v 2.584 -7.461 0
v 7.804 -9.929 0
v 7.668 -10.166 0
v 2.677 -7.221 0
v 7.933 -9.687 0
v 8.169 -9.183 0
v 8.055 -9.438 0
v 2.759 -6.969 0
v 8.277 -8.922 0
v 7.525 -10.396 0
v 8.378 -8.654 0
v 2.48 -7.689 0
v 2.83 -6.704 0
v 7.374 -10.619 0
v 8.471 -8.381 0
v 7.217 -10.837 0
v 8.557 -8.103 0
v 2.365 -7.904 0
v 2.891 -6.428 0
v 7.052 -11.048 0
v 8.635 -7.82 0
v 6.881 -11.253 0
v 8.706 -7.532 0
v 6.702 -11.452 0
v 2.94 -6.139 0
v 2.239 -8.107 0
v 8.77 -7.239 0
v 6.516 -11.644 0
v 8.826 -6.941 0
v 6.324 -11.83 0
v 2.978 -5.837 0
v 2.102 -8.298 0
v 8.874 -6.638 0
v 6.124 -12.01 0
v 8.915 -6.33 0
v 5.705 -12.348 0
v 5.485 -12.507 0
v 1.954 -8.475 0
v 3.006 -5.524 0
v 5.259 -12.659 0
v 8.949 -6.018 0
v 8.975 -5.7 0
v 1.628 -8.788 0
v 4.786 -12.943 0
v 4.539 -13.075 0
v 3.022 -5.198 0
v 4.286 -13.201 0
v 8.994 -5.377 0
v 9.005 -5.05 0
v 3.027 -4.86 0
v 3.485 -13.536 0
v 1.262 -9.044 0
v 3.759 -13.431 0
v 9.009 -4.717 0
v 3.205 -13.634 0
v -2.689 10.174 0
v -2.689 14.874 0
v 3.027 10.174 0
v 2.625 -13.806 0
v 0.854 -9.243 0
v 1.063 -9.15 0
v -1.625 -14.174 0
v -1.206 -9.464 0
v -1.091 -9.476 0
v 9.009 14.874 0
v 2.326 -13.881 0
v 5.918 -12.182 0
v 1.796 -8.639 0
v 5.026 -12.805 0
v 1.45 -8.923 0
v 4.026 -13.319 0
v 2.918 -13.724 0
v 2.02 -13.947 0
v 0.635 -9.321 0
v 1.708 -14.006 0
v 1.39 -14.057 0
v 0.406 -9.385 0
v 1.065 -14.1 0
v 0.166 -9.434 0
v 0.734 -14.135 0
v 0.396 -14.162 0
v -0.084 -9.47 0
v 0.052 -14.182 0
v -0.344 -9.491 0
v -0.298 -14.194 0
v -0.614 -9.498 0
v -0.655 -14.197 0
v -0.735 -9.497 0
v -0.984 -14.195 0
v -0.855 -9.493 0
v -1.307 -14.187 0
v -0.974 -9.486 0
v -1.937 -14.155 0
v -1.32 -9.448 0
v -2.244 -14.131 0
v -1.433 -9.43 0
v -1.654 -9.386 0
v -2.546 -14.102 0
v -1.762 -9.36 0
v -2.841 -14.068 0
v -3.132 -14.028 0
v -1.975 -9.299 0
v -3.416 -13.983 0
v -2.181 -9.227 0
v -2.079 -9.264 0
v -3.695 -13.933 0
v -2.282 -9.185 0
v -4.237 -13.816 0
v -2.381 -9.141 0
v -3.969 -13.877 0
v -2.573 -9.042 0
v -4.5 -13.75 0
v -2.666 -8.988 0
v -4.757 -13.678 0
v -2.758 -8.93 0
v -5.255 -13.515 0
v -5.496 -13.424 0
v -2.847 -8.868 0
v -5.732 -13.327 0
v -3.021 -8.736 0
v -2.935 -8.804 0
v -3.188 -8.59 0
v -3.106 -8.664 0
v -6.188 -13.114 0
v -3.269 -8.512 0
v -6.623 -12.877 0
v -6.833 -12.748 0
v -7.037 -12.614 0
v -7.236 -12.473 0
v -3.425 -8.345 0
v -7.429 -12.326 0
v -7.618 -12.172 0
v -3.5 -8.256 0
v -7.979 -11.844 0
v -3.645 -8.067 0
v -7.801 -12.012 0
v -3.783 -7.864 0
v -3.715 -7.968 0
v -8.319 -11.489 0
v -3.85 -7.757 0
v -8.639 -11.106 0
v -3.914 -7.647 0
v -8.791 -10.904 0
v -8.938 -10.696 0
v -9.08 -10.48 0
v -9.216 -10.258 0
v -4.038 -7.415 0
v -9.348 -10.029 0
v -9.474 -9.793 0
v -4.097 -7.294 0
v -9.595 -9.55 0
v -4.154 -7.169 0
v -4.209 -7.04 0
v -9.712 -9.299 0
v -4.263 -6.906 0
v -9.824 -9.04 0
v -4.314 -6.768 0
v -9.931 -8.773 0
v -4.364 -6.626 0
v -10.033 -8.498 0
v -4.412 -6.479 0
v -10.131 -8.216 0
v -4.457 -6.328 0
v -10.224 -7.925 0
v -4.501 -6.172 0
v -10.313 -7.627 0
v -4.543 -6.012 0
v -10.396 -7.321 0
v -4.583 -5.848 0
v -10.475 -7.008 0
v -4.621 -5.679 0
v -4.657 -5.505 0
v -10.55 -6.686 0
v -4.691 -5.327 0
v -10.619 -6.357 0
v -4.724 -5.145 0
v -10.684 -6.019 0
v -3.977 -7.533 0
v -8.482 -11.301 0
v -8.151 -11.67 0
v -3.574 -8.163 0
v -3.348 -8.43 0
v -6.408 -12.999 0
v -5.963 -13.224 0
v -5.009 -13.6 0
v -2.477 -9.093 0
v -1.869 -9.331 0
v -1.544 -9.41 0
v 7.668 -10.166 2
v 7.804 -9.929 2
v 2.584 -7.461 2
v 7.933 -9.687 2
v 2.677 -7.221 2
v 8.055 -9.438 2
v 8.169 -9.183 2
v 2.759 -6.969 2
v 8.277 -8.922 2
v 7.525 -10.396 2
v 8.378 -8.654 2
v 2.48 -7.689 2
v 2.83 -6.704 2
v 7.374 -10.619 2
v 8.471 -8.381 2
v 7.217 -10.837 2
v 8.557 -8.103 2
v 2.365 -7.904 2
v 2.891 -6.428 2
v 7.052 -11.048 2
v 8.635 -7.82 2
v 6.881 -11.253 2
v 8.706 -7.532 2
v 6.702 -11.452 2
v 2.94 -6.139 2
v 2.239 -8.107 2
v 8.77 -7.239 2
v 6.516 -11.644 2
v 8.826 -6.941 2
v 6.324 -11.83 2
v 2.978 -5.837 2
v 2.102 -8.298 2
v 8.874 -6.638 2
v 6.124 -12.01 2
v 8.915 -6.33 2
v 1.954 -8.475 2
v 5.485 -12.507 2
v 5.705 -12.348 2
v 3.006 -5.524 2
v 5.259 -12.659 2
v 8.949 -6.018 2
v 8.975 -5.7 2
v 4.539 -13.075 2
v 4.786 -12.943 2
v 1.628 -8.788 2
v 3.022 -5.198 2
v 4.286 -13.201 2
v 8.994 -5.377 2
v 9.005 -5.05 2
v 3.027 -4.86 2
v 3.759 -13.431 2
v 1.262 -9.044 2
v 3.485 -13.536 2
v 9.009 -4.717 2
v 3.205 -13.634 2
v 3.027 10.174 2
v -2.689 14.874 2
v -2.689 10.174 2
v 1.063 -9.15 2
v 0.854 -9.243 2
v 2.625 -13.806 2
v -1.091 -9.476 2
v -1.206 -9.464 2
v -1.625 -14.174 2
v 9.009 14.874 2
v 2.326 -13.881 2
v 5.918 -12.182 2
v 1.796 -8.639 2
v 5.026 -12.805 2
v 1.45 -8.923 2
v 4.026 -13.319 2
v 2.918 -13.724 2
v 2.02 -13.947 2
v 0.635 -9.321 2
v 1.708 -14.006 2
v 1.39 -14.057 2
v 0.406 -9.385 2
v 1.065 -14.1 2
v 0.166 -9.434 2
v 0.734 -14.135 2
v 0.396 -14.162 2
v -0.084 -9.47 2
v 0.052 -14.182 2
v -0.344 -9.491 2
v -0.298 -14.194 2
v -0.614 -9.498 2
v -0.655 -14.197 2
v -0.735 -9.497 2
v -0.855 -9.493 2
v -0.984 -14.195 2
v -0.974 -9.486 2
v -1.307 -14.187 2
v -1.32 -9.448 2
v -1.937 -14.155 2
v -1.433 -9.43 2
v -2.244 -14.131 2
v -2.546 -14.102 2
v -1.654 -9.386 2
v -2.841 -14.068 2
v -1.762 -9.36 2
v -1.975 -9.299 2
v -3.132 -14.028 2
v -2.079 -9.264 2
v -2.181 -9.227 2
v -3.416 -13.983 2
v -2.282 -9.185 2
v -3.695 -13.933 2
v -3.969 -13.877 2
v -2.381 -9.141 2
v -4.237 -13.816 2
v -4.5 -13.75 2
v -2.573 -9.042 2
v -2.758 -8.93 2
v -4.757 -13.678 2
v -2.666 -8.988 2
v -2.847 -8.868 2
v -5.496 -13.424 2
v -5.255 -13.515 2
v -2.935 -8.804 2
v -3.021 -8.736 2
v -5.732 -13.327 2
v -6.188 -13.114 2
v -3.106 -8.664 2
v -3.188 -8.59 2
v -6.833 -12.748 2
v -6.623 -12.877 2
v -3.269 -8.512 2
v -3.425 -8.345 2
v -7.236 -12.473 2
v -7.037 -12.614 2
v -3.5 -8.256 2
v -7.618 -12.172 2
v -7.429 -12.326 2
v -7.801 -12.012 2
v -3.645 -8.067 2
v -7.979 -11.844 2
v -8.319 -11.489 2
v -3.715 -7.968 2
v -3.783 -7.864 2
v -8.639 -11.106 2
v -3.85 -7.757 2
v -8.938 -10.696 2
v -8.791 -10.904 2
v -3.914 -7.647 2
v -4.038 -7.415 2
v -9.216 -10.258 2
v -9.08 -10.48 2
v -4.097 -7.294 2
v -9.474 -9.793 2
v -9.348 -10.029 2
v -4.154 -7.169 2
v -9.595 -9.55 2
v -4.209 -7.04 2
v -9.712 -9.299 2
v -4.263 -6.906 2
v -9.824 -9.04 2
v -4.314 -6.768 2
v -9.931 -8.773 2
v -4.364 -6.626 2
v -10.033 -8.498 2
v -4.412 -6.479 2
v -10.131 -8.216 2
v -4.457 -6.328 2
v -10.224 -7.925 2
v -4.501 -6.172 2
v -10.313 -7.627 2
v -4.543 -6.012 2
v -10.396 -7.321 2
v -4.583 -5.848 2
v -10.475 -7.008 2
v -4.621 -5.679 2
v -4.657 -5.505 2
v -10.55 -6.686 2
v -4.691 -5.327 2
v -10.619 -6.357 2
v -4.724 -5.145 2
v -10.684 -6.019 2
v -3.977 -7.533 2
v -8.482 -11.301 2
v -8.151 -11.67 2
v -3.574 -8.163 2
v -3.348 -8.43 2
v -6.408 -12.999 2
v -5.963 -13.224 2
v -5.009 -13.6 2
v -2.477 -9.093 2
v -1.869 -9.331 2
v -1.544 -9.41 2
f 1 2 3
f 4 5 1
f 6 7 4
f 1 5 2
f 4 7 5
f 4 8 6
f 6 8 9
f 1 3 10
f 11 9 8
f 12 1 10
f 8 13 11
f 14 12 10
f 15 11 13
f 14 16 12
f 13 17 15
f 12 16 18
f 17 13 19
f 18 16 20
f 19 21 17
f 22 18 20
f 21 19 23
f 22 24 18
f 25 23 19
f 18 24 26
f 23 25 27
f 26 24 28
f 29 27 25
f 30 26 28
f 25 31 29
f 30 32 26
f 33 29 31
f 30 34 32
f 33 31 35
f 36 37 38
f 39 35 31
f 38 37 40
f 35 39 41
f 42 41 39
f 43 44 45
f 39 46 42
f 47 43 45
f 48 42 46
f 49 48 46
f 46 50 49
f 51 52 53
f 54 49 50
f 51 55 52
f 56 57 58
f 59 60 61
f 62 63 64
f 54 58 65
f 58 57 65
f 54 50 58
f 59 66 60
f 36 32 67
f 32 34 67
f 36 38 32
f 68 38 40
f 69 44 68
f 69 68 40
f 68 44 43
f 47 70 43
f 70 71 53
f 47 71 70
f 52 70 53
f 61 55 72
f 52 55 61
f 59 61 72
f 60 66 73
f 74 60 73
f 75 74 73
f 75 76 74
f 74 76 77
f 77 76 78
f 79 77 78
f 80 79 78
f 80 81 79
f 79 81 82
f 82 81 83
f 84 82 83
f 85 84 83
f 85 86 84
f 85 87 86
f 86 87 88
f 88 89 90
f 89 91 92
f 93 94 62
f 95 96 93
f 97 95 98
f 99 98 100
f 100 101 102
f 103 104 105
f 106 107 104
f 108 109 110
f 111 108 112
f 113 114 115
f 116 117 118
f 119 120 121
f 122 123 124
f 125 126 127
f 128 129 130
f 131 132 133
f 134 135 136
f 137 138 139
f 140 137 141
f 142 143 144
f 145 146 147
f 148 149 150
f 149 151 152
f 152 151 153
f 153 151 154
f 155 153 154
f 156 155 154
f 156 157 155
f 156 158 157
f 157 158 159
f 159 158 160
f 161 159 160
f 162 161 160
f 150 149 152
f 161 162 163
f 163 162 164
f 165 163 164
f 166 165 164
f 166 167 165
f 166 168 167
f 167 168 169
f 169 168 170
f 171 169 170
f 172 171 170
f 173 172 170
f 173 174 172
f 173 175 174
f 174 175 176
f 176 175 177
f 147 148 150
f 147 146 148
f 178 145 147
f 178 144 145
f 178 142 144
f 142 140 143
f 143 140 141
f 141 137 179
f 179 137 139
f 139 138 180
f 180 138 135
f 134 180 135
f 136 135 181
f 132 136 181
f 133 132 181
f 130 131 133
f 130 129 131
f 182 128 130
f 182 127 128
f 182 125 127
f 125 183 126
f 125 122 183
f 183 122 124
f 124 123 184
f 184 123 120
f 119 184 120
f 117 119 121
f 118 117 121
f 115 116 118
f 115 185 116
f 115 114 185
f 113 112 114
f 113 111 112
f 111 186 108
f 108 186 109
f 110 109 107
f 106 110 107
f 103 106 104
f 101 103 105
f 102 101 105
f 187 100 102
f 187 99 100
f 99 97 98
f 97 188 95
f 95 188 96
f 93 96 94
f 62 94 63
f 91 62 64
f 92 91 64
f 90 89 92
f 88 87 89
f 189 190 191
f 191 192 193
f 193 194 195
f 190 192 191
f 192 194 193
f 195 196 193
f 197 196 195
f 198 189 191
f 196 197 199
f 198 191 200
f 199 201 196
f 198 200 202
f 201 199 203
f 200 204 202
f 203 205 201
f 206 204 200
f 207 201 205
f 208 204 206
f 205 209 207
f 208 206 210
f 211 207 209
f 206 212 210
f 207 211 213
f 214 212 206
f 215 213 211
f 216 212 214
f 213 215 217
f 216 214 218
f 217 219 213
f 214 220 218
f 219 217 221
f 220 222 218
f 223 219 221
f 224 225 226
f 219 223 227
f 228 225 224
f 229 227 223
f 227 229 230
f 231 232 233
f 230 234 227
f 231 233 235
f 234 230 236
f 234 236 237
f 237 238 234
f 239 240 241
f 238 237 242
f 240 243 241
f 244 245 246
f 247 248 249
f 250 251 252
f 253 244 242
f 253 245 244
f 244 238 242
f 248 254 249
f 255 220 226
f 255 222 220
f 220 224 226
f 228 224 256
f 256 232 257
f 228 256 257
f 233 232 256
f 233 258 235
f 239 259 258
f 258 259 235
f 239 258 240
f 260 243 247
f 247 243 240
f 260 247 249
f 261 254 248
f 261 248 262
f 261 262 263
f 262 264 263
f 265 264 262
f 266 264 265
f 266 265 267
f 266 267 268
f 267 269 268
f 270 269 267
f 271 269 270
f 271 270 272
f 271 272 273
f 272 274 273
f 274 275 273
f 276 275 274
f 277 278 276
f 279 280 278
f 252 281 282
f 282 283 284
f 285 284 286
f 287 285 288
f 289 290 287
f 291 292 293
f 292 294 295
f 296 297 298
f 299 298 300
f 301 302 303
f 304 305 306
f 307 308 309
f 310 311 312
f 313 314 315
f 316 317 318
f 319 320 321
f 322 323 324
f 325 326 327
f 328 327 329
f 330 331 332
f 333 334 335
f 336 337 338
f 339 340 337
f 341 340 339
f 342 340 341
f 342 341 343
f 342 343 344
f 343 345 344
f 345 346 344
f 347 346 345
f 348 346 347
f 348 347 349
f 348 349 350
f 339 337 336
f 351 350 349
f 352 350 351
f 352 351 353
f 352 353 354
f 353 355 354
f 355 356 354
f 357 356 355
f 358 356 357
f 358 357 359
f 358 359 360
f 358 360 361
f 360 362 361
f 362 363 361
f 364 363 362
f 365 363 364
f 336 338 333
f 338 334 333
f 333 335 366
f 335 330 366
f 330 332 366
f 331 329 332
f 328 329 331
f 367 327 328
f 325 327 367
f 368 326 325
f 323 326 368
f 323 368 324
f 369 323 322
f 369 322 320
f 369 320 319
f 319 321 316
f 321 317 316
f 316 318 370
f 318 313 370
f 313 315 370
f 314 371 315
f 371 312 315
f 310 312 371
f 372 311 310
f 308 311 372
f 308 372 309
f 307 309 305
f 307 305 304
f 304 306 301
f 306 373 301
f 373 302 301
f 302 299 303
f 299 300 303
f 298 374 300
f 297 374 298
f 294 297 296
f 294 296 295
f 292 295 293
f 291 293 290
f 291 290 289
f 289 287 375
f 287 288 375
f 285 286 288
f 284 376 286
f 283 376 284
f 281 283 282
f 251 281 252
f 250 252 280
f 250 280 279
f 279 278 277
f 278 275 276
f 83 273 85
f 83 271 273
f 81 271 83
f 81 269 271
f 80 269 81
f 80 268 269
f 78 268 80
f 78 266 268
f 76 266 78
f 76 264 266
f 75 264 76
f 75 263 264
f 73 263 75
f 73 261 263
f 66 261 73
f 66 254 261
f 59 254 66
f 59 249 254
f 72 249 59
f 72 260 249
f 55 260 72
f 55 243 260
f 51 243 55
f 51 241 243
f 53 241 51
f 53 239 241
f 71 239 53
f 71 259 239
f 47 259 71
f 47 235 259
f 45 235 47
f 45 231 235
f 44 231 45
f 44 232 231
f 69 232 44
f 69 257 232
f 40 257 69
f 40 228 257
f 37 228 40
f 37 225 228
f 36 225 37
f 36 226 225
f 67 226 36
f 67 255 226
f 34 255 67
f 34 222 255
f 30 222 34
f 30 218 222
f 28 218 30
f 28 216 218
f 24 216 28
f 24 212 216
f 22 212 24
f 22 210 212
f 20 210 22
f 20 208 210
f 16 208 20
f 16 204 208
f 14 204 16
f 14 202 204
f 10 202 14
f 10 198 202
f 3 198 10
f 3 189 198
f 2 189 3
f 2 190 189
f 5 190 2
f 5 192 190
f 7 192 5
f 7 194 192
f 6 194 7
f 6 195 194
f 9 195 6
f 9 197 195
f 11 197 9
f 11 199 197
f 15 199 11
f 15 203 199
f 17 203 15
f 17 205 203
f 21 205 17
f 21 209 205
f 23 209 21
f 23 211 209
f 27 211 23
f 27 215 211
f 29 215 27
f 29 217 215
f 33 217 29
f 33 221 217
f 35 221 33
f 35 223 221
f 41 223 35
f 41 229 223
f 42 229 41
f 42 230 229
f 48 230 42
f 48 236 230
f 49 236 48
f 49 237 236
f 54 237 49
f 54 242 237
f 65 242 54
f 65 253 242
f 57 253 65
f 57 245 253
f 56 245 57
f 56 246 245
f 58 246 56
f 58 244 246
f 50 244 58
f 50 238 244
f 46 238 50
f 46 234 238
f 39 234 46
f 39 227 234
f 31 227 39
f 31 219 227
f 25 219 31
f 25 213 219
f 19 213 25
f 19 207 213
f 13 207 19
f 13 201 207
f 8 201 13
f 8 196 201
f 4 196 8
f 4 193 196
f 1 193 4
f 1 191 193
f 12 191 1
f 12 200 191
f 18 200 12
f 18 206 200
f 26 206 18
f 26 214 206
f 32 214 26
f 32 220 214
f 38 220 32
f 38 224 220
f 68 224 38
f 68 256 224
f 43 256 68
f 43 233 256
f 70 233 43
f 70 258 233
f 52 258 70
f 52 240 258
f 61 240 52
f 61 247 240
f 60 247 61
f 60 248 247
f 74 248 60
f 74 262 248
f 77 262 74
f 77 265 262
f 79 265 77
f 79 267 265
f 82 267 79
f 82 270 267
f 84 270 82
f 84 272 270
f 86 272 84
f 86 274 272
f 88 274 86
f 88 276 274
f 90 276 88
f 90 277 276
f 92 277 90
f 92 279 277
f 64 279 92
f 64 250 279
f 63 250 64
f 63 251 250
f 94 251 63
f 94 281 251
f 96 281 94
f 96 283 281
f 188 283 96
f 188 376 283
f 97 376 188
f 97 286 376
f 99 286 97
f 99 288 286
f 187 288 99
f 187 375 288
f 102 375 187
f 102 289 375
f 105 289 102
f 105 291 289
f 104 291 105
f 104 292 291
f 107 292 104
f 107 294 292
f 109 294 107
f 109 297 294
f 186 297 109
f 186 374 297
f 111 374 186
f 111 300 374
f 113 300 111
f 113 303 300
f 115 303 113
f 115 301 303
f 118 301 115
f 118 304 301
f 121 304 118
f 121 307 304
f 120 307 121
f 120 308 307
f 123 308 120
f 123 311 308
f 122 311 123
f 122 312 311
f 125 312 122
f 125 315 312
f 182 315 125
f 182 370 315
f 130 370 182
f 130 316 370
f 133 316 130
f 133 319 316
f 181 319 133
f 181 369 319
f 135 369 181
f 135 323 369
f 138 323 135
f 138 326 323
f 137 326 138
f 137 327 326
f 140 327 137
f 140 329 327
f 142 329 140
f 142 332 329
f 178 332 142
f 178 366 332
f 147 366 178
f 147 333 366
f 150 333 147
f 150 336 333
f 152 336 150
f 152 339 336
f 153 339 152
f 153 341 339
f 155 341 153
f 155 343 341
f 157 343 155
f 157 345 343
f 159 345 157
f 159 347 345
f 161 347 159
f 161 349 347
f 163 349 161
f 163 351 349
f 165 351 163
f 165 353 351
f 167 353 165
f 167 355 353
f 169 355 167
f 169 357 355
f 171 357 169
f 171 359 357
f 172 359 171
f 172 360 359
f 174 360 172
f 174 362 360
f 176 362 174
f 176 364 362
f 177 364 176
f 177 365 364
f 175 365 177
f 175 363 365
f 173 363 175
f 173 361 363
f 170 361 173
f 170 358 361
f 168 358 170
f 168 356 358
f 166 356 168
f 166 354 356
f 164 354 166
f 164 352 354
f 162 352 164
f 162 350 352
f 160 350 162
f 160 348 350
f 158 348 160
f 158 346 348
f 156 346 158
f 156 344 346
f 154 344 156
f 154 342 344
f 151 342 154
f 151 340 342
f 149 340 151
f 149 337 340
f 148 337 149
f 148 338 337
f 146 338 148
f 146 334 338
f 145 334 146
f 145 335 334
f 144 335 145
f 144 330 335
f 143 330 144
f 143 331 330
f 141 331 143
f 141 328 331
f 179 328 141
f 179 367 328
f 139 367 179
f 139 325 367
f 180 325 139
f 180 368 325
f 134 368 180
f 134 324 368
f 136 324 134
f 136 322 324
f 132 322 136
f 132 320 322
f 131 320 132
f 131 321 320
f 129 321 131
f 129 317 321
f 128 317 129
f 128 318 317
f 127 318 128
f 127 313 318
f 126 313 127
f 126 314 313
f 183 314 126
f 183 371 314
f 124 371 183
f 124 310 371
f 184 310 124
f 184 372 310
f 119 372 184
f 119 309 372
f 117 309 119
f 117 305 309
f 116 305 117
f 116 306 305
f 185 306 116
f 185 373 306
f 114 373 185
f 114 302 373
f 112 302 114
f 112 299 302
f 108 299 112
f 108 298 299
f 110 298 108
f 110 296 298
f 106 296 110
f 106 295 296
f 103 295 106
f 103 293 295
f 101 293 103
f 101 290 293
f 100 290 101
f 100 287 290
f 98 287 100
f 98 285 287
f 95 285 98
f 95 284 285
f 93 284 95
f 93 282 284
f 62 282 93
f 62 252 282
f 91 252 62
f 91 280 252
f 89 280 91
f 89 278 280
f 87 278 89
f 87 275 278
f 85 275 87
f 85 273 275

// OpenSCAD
// file: lib/scale_overlay.scad
module scale_overlay(length = 100, major_step = 10, tick_height = 2, tick_width = 0.8, base_height = 0.4) {
    color([0.1, 0.1, 0.1])
        cube([length, tick_width, base_height]);

    for (x = [0:major_step:length]) {
        color([0.1, 0.1, 0.1])
            translate([x, 0, 0])
                cube([tick_width, tick_width, tick_height]);
    }
}
// main file
// Small flat letter "J" — a quick test print.

include <lib/scale_overlay.scad>;

$fn = 100;

letter = "J";
size = 30;
thickness = 2;
text_font = "Liberation Sans:style=Bold";
show_scale = false;

module jay_model(
    letter = "J",
    size = 30,
    thickness = 2,
    text_font = "Liberation Sans:style=Bold"
) {
    linear_extrude(height = thickness)
        text(letter, size = size, halign = "center", valign = "center", font = text_font);
}

jay_model(
    letter = letter,
    size = size,
    thickness = thickness,
    text_font = text_font
);

if (show_scale) {
    translate([-size, -size * 0.8, 0])
        scale_overlay(length = 100, major_step = 10);
}
